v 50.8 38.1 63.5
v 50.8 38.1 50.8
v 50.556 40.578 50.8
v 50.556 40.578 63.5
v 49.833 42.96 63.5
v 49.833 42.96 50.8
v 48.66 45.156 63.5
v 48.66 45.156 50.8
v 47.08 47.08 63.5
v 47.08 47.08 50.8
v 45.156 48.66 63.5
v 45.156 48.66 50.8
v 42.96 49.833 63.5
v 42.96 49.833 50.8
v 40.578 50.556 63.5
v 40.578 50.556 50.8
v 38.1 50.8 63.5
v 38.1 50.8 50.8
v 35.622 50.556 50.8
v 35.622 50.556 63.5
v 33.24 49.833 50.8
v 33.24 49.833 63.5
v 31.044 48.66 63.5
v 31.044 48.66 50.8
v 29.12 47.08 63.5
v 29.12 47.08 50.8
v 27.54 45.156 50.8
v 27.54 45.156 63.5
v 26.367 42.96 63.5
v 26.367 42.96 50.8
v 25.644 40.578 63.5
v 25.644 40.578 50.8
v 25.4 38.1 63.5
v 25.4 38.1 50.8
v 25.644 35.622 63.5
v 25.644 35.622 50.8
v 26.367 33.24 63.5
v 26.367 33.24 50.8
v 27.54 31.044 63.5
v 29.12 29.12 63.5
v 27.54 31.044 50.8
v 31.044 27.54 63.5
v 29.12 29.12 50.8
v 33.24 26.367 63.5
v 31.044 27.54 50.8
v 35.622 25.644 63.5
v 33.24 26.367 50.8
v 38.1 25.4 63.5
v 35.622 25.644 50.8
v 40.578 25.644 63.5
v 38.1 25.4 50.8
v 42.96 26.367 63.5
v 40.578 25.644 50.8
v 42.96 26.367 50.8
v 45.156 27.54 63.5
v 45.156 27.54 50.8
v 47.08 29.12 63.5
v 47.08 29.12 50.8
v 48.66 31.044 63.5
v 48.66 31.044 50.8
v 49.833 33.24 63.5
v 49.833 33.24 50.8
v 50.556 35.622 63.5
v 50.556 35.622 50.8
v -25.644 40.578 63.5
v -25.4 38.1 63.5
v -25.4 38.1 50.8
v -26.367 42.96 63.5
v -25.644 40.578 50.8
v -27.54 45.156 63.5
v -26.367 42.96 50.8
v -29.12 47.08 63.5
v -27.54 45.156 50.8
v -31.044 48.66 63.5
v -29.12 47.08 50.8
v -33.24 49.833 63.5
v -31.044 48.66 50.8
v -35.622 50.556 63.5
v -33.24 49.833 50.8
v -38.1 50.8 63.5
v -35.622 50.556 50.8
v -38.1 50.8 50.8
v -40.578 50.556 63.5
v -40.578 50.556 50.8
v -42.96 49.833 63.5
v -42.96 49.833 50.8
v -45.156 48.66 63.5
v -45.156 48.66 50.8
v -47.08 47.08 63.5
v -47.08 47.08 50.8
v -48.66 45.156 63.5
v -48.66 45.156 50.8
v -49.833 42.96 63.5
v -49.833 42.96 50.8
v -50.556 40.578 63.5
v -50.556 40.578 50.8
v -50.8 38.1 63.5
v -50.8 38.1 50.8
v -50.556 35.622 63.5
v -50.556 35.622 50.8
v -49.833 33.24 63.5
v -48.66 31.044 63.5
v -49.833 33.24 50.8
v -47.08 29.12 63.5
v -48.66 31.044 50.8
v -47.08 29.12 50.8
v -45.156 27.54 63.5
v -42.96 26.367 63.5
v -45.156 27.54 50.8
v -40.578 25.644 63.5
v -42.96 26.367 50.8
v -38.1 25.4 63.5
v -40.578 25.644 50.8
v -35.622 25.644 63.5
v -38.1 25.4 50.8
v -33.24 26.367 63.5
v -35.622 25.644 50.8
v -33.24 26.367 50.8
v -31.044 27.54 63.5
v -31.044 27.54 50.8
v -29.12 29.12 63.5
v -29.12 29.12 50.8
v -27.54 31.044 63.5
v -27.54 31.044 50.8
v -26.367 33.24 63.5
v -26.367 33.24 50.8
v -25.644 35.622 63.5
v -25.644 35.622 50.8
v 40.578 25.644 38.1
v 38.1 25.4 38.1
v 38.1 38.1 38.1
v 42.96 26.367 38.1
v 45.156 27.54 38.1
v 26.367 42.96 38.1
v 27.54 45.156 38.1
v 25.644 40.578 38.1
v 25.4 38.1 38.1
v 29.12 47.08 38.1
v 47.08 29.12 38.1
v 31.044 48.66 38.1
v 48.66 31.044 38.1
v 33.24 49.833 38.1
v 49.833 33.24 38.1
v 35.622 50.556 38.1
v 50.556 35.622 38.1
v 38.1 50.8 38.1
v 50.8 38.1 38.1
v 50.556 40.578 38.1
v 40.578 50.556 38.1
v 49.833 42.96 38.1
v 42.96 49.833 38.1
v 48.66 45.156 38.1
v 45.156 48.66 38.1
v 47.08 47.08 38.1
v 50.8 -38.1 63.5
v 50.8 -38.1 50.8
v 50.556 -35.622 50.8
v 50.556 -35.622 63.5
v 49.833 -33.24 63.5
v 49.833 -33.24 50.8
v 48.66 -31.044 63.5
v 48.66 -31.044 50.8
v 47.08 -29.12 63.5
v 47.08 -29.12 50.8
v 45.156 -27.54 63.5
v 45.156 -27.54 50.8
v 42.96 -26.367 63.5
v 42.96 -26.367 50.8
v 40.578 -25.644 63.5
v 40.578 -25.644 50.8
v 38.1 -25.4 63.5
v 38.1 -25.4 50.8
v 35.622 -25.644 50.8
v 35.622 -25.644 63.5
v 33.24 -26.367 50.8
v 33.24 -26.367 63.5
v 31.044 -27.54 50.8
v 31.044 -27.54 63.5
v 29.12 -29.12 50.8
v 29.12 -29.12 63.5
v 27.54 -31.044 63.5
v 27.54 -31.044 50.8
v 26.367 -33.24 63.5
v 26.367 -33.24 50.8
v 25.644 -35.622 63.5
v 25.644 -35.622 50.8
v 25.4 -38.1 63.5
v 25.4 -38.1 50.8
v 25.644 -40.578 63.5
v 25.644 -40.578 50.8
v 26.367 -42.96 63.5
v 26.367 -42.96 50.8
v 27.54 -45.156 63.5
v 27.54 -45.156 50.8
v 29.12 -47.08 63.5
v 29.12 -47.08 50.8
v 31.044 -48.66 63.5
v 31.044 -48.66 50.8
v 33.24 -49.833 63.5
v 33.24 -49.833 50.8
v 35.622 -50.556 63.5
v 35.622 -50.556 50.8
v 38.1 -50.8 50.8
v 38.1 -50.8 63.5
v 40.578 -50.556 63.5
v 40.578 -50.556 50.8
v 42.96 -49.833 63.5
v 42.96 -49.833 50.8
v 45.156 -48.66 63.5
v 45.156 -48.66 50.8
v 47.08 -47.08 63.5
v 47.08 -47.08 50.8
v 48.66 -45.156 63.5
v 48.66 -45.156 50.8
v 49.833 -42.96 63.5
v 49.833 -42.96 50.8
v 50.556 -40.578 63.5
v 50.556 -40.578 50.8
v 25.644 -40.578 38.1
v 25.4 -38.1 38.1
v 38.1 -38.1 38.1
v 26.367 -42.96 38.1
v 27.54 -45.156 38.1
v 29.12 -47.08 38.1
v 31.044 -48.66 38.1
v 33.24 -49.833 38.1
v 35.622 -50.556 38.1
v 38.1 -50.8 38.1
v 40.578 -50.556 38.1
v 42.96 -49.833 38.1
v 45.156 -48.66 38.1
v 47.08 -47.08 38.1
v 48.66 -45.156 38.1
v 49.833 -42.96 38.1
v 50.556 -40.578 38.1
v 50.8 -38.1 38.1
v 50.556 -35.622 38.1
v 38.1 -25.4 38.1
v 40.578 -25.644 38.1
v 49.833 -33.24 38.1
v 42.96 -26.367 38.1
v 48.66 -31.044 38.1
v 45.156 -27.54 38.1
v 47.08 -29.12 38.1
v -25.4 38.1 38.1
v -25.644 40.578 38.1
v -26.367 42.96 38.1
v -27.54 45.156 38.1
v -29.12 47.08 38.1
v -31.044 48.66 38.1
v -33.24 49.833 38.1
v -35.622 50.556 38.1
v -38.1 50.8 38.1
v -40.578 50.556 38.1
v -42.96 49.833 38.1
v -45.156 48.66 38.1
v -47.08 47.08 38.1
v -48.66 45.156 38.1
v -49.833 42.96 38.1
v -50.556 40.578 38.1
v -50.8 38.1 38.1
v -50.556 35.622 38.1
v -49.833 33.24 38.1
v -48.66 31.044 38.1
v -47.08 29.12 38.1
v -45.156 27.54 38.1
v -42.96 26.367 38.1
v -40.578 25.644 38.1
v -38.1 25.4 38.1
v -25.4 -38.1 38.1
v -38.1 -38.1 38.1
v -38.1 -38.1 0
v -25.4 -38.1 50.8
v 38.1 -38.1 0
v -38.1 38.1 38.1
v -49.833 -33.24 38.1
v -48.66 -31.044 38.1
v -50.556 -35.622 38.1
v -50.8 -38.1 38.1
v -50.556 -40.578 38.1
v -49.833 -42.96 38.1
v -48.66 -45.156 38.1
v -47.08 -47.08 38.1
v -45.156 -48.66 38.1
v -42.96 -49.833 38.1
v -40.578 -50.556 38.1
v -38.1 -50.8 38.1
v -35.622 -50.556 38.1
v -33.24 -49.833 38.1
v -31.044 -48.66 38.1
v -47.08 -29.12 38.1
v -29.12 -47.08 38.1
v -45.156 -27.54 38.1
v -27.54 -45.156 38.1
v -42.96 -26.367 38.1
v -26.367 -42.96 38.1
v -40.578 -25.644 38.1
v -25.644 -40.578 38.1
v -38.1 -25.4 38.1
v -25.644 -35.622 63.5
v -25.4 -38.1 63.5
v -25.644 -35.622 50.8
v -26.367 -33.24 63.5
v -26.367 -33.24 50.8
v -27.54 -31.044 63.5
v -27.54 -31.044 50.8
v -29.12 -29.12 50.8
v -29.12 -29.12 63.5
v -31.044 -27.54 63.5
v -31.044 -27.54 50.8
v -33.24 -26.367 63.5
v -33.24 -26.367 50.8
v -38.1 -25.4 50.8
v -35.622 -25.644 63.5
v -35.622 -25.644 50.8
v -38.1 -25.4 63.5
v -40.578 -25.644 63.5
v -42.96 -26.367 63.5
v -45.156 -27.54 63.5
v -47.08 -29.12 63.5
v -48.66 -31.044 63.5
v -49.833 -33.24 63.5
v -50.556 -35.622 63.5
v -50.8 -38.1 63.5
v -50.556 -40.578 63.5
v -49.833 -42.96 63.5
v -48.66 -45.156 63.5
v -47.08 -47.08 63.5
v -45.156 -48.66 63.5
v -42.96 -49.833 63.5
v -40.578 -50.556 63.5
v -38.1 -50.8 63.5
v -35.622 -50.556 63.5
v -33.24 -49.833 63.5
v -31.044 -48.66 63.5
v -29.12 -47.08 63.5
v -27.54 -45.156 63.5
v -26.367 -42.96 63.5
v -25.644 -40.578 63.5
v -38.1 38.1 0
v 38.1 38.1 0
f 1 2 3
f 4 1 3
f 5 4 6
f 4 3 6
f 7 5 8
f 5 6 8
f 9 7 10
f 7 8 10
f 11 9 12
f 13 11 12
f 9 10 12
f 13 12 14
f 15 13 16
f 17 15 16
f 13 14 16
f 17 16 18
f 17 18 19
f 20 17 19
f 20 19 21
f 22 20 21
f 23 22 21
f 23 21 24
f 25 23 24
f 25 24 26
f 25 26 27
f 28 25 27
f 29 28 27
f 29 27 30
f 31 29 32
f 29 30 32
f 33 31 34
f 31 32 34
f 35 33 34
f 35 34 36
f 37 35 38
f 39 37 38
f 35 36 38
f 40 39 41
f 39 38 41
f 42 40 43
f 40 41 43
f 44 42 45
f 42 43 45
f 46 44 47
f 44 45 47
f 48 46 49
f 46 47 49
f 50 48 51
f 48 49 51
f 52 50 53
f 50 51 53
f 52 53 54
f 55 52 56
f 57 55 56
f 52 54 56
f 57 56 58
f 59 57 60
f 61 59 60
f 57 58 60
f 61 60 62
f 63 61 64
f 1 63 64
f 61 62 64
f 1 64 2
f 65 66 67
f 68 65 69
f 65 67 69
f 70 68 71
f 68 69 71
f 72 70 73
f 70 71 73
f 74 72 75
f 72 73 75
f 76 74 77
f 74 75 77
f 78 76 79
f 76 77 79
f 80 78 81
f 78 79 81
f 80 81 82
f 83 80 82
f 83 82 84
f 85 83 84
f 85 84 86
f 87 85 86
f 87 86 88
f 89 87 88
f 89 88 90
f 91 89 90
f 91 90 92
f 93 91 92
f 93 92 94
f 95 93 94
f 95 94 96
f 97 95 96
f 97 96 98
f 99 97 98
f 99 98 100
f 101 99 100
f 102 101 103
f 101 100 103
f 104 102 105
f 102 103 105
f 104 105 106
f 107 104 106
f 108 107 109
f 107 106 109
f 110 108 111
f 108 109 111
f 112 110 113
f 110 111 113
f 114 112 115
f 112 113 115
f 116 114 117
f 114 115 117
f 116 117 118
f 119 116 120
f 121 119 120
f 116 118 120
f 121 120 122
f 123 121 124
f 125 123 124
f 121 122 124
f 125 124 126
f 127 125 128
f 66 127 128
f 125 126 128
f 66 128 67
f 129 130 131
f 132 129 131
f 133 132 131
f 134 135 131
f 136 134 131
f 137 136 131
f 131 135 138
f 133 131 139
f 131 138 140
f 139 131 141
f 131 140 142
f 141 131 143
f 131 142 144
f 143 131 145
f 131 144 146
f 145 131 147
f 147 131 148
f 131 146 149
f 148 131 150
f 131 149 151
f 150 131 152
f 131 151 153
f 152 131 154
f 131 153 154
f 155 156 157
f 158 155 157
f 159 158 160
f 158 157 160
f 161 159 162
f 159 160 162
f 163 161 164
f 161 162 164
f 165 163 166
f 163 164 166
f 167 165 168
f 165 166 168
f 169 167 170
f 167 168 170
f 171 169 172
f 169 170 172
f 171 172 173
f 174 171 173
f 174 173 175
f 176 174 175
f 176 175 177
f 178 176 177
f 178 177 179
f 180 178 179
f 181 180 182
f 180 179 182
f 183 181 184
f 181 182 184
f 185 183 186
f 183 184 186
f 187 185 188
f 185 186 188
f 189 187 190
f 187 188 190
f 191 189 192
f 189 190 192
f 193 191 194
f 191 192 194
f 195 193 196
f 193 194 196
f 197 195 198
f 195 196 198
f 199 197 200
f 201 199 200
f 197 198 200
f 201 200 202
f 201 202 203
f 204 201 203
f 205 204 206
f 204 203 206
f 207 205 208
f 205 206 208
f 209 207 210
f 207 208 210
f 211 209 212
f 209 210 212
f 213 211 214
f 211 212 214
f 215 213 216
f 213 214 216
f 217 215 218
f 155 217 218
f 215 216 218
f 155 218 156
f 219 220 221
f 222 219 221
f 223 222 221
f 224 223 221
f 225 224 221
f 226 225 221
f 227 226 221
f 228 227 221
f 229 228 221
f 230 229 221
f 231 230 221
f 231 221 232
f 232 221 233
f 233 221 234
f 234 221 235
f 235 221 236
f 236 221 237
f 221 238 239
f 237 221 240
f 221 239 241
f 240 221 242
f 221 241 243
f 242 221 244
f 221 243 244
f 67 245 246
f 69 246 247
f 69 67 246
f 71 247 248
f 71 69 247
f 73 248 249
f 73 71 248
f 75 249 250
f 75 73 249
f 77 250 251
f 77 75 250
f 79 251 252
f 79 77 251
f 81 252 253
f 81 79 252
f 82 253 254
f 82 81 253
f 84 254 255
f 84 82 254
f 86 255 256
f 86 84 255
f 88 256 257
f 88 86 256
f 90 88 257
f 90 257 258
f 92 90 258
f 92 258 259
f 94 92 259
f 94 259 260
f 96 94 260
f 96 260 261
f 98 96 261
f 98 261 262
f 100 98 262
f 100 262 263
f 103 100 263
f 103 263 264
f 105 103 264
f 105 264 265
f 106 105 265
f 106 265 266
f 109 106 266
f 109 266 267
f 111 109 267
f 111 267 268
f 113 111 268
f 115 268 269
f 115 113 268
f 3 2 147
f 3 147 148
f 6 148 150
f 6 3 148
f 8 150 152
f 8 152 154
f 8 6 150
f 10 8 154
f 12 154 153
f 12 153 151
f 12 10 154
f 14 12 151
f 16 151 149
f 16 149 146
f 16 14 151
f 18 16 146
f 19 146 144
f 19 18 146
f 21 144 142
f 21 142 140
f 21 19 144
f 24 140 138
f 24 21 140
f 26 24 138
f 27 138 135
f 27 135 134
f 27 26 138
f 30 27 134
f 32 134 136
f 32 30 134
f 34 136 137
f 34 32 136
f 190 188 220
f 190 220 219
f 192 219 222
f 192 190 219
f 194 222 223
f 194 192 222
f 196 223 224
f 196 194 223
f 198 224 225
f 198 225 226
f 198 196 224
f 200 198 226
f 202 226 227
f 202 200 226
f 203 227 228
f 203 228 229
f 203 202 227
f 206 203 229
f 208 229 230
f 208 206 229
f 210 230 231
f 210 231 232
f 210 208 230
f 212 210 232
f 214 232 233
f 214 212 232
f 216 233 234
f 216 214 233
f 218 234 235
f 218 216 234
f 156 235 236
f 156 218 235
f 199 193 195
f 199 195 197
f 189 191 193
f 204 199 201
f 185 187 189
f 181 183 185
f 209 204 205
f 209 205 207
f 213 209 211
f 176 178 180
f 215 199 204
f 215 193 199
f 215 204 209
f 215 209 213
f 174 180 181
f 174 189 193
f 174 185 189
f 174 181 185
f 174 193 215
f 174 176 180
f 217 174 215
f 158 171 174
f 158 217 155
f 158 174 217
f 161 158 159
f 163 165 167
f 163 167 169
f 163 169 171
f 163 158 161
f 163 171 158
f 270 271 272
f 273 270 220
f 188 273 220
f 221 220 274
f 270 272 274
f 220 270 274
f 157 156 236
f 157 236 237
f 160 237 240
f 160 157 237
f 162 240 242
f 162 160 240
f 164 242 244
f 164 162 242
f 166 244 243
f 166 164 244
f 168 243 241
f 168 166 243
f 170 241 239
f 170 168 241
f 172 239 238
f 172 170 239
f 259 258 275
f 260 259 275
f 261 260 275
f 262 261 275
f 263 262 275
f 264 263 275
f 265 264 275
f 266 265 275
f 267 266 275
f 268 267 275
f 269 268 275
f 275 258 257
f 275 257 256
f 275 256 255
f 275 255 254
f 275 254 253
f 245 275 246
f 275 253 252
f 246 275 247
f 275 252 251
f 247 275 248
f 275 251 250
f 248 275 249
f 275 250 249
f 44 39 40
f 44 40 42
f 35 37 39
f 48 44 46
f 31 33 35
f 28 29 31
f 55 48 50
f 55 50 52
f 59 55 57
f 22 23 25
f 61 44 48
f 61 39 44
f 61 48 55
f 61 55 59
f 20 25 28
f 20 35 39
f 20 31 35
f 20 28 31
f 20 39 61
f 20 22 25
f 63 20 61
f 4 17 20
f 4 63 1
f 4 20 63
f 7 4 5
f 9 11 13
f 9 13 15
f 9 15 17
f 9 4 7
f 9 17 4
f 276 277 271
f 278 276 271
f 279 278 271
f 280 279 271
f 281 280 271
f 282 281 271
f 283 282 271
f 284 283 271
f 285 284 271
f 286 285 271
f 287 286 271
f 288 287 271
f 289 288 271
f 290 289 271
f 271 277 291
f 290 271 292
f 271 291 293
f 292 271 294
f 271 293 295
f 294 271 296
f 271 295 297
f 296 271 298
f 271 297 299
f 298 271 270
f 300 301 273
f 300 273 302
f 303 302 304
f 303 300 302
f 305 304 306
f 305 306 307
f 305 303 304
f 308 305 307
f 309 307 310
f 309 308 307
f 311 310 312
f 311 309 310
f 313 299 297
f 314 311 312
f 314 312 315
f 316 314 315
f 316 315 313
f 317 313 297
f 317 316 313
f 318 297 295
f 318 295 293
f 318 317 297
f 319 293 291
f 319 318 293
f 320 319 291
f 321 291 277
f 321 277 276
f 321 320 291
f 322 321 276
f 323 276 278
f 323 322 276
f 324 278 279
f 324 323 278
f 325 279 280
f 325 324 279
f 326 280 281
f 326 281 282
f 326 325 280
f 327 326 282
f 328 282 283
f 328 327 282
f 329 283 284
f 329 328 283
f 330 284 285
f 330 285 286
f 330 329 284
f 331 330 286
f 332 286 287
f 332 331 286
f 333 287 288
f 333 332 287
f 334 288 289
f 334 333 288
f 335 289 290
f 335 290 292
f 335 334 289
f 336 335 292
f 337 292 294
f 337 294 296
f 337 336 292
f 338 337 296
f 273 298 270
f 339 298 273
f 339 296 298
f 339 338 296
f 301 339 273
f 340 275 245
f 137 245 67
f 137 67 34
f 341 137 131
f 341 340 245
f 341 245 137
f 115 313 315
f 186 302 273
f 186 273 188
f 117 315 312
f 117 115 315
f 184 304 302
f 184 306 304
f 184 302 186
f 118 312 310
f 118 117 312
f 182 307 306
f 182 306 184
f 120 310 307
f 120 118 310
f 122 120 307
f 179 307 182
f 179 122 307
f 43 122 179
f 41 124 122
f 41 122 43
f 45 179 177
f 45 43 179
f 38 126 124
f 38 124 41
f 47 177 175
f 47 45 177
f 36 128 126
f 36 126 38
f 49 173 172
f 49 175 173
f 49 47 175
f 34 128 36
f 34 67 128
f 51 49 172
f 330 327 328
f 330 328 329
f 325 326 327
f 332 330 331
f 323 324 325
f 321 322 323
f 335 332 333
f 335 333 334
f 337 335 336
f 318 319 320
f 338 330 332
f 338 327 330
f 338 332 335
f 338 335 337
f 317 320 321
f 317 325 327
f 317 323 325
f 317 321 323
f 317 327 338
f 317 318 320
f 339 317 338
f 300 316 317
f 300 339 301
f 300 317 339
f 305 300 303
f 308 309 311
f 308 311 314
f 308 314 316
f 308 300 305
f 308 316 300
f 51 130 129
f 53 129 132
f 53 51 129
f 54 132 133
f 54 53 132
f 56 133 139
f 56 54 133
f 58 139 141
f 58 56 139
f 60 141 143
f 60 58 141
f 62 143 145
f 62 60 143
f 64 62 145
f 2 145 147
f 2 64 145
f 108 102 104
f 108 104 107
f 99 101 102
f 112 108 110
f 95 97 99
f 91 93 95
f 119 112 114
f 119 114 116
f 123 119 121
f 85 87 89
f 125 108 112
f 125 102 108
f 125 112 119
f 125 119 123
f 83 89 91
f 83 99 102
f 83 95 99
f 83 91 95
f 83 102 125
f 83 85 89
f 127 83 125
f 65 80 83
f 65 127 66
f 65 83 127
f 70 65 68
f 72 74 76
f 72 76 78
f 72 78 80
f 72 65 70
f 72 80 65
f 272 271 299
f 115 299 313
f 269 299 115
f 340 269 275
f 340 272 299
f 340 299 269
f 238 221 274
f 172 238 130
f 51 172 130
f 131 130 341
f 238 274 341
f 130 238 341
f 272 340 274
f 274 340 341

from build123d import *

# Parameters (mm, degrees)
F0_W     = 76.2
F0_H     = 76.2
F1_DEPTH = 50.8
F2_R     = 12.7
F3_DEPTH = 12.7


with BuildPart() as f1:
    # F0 (on Top) → F1 (new body)
    with BuildSketch(Plane.XY):
        Rectangle(F0_W, F0_H)
    extrude(amount=F1_DEPTH)

    # F2 (on face) → F3 (join, symmetric)
    with BuildSketch(Plane.XY.offset(50.8)):
        with Locations((-38.1, 38.1)):
            Circle(F2_R)
        with Locations((38.1, 38.1)):
            Circle(F2_R)
        with Locations((38.1, -38.1)):
            Circle(F2_R)
        with Locations((-38.1, -38.1)):
            Circle(F2_R)
    extrude(amount=F3_DEPTH, both=True)


solid = f1.part
